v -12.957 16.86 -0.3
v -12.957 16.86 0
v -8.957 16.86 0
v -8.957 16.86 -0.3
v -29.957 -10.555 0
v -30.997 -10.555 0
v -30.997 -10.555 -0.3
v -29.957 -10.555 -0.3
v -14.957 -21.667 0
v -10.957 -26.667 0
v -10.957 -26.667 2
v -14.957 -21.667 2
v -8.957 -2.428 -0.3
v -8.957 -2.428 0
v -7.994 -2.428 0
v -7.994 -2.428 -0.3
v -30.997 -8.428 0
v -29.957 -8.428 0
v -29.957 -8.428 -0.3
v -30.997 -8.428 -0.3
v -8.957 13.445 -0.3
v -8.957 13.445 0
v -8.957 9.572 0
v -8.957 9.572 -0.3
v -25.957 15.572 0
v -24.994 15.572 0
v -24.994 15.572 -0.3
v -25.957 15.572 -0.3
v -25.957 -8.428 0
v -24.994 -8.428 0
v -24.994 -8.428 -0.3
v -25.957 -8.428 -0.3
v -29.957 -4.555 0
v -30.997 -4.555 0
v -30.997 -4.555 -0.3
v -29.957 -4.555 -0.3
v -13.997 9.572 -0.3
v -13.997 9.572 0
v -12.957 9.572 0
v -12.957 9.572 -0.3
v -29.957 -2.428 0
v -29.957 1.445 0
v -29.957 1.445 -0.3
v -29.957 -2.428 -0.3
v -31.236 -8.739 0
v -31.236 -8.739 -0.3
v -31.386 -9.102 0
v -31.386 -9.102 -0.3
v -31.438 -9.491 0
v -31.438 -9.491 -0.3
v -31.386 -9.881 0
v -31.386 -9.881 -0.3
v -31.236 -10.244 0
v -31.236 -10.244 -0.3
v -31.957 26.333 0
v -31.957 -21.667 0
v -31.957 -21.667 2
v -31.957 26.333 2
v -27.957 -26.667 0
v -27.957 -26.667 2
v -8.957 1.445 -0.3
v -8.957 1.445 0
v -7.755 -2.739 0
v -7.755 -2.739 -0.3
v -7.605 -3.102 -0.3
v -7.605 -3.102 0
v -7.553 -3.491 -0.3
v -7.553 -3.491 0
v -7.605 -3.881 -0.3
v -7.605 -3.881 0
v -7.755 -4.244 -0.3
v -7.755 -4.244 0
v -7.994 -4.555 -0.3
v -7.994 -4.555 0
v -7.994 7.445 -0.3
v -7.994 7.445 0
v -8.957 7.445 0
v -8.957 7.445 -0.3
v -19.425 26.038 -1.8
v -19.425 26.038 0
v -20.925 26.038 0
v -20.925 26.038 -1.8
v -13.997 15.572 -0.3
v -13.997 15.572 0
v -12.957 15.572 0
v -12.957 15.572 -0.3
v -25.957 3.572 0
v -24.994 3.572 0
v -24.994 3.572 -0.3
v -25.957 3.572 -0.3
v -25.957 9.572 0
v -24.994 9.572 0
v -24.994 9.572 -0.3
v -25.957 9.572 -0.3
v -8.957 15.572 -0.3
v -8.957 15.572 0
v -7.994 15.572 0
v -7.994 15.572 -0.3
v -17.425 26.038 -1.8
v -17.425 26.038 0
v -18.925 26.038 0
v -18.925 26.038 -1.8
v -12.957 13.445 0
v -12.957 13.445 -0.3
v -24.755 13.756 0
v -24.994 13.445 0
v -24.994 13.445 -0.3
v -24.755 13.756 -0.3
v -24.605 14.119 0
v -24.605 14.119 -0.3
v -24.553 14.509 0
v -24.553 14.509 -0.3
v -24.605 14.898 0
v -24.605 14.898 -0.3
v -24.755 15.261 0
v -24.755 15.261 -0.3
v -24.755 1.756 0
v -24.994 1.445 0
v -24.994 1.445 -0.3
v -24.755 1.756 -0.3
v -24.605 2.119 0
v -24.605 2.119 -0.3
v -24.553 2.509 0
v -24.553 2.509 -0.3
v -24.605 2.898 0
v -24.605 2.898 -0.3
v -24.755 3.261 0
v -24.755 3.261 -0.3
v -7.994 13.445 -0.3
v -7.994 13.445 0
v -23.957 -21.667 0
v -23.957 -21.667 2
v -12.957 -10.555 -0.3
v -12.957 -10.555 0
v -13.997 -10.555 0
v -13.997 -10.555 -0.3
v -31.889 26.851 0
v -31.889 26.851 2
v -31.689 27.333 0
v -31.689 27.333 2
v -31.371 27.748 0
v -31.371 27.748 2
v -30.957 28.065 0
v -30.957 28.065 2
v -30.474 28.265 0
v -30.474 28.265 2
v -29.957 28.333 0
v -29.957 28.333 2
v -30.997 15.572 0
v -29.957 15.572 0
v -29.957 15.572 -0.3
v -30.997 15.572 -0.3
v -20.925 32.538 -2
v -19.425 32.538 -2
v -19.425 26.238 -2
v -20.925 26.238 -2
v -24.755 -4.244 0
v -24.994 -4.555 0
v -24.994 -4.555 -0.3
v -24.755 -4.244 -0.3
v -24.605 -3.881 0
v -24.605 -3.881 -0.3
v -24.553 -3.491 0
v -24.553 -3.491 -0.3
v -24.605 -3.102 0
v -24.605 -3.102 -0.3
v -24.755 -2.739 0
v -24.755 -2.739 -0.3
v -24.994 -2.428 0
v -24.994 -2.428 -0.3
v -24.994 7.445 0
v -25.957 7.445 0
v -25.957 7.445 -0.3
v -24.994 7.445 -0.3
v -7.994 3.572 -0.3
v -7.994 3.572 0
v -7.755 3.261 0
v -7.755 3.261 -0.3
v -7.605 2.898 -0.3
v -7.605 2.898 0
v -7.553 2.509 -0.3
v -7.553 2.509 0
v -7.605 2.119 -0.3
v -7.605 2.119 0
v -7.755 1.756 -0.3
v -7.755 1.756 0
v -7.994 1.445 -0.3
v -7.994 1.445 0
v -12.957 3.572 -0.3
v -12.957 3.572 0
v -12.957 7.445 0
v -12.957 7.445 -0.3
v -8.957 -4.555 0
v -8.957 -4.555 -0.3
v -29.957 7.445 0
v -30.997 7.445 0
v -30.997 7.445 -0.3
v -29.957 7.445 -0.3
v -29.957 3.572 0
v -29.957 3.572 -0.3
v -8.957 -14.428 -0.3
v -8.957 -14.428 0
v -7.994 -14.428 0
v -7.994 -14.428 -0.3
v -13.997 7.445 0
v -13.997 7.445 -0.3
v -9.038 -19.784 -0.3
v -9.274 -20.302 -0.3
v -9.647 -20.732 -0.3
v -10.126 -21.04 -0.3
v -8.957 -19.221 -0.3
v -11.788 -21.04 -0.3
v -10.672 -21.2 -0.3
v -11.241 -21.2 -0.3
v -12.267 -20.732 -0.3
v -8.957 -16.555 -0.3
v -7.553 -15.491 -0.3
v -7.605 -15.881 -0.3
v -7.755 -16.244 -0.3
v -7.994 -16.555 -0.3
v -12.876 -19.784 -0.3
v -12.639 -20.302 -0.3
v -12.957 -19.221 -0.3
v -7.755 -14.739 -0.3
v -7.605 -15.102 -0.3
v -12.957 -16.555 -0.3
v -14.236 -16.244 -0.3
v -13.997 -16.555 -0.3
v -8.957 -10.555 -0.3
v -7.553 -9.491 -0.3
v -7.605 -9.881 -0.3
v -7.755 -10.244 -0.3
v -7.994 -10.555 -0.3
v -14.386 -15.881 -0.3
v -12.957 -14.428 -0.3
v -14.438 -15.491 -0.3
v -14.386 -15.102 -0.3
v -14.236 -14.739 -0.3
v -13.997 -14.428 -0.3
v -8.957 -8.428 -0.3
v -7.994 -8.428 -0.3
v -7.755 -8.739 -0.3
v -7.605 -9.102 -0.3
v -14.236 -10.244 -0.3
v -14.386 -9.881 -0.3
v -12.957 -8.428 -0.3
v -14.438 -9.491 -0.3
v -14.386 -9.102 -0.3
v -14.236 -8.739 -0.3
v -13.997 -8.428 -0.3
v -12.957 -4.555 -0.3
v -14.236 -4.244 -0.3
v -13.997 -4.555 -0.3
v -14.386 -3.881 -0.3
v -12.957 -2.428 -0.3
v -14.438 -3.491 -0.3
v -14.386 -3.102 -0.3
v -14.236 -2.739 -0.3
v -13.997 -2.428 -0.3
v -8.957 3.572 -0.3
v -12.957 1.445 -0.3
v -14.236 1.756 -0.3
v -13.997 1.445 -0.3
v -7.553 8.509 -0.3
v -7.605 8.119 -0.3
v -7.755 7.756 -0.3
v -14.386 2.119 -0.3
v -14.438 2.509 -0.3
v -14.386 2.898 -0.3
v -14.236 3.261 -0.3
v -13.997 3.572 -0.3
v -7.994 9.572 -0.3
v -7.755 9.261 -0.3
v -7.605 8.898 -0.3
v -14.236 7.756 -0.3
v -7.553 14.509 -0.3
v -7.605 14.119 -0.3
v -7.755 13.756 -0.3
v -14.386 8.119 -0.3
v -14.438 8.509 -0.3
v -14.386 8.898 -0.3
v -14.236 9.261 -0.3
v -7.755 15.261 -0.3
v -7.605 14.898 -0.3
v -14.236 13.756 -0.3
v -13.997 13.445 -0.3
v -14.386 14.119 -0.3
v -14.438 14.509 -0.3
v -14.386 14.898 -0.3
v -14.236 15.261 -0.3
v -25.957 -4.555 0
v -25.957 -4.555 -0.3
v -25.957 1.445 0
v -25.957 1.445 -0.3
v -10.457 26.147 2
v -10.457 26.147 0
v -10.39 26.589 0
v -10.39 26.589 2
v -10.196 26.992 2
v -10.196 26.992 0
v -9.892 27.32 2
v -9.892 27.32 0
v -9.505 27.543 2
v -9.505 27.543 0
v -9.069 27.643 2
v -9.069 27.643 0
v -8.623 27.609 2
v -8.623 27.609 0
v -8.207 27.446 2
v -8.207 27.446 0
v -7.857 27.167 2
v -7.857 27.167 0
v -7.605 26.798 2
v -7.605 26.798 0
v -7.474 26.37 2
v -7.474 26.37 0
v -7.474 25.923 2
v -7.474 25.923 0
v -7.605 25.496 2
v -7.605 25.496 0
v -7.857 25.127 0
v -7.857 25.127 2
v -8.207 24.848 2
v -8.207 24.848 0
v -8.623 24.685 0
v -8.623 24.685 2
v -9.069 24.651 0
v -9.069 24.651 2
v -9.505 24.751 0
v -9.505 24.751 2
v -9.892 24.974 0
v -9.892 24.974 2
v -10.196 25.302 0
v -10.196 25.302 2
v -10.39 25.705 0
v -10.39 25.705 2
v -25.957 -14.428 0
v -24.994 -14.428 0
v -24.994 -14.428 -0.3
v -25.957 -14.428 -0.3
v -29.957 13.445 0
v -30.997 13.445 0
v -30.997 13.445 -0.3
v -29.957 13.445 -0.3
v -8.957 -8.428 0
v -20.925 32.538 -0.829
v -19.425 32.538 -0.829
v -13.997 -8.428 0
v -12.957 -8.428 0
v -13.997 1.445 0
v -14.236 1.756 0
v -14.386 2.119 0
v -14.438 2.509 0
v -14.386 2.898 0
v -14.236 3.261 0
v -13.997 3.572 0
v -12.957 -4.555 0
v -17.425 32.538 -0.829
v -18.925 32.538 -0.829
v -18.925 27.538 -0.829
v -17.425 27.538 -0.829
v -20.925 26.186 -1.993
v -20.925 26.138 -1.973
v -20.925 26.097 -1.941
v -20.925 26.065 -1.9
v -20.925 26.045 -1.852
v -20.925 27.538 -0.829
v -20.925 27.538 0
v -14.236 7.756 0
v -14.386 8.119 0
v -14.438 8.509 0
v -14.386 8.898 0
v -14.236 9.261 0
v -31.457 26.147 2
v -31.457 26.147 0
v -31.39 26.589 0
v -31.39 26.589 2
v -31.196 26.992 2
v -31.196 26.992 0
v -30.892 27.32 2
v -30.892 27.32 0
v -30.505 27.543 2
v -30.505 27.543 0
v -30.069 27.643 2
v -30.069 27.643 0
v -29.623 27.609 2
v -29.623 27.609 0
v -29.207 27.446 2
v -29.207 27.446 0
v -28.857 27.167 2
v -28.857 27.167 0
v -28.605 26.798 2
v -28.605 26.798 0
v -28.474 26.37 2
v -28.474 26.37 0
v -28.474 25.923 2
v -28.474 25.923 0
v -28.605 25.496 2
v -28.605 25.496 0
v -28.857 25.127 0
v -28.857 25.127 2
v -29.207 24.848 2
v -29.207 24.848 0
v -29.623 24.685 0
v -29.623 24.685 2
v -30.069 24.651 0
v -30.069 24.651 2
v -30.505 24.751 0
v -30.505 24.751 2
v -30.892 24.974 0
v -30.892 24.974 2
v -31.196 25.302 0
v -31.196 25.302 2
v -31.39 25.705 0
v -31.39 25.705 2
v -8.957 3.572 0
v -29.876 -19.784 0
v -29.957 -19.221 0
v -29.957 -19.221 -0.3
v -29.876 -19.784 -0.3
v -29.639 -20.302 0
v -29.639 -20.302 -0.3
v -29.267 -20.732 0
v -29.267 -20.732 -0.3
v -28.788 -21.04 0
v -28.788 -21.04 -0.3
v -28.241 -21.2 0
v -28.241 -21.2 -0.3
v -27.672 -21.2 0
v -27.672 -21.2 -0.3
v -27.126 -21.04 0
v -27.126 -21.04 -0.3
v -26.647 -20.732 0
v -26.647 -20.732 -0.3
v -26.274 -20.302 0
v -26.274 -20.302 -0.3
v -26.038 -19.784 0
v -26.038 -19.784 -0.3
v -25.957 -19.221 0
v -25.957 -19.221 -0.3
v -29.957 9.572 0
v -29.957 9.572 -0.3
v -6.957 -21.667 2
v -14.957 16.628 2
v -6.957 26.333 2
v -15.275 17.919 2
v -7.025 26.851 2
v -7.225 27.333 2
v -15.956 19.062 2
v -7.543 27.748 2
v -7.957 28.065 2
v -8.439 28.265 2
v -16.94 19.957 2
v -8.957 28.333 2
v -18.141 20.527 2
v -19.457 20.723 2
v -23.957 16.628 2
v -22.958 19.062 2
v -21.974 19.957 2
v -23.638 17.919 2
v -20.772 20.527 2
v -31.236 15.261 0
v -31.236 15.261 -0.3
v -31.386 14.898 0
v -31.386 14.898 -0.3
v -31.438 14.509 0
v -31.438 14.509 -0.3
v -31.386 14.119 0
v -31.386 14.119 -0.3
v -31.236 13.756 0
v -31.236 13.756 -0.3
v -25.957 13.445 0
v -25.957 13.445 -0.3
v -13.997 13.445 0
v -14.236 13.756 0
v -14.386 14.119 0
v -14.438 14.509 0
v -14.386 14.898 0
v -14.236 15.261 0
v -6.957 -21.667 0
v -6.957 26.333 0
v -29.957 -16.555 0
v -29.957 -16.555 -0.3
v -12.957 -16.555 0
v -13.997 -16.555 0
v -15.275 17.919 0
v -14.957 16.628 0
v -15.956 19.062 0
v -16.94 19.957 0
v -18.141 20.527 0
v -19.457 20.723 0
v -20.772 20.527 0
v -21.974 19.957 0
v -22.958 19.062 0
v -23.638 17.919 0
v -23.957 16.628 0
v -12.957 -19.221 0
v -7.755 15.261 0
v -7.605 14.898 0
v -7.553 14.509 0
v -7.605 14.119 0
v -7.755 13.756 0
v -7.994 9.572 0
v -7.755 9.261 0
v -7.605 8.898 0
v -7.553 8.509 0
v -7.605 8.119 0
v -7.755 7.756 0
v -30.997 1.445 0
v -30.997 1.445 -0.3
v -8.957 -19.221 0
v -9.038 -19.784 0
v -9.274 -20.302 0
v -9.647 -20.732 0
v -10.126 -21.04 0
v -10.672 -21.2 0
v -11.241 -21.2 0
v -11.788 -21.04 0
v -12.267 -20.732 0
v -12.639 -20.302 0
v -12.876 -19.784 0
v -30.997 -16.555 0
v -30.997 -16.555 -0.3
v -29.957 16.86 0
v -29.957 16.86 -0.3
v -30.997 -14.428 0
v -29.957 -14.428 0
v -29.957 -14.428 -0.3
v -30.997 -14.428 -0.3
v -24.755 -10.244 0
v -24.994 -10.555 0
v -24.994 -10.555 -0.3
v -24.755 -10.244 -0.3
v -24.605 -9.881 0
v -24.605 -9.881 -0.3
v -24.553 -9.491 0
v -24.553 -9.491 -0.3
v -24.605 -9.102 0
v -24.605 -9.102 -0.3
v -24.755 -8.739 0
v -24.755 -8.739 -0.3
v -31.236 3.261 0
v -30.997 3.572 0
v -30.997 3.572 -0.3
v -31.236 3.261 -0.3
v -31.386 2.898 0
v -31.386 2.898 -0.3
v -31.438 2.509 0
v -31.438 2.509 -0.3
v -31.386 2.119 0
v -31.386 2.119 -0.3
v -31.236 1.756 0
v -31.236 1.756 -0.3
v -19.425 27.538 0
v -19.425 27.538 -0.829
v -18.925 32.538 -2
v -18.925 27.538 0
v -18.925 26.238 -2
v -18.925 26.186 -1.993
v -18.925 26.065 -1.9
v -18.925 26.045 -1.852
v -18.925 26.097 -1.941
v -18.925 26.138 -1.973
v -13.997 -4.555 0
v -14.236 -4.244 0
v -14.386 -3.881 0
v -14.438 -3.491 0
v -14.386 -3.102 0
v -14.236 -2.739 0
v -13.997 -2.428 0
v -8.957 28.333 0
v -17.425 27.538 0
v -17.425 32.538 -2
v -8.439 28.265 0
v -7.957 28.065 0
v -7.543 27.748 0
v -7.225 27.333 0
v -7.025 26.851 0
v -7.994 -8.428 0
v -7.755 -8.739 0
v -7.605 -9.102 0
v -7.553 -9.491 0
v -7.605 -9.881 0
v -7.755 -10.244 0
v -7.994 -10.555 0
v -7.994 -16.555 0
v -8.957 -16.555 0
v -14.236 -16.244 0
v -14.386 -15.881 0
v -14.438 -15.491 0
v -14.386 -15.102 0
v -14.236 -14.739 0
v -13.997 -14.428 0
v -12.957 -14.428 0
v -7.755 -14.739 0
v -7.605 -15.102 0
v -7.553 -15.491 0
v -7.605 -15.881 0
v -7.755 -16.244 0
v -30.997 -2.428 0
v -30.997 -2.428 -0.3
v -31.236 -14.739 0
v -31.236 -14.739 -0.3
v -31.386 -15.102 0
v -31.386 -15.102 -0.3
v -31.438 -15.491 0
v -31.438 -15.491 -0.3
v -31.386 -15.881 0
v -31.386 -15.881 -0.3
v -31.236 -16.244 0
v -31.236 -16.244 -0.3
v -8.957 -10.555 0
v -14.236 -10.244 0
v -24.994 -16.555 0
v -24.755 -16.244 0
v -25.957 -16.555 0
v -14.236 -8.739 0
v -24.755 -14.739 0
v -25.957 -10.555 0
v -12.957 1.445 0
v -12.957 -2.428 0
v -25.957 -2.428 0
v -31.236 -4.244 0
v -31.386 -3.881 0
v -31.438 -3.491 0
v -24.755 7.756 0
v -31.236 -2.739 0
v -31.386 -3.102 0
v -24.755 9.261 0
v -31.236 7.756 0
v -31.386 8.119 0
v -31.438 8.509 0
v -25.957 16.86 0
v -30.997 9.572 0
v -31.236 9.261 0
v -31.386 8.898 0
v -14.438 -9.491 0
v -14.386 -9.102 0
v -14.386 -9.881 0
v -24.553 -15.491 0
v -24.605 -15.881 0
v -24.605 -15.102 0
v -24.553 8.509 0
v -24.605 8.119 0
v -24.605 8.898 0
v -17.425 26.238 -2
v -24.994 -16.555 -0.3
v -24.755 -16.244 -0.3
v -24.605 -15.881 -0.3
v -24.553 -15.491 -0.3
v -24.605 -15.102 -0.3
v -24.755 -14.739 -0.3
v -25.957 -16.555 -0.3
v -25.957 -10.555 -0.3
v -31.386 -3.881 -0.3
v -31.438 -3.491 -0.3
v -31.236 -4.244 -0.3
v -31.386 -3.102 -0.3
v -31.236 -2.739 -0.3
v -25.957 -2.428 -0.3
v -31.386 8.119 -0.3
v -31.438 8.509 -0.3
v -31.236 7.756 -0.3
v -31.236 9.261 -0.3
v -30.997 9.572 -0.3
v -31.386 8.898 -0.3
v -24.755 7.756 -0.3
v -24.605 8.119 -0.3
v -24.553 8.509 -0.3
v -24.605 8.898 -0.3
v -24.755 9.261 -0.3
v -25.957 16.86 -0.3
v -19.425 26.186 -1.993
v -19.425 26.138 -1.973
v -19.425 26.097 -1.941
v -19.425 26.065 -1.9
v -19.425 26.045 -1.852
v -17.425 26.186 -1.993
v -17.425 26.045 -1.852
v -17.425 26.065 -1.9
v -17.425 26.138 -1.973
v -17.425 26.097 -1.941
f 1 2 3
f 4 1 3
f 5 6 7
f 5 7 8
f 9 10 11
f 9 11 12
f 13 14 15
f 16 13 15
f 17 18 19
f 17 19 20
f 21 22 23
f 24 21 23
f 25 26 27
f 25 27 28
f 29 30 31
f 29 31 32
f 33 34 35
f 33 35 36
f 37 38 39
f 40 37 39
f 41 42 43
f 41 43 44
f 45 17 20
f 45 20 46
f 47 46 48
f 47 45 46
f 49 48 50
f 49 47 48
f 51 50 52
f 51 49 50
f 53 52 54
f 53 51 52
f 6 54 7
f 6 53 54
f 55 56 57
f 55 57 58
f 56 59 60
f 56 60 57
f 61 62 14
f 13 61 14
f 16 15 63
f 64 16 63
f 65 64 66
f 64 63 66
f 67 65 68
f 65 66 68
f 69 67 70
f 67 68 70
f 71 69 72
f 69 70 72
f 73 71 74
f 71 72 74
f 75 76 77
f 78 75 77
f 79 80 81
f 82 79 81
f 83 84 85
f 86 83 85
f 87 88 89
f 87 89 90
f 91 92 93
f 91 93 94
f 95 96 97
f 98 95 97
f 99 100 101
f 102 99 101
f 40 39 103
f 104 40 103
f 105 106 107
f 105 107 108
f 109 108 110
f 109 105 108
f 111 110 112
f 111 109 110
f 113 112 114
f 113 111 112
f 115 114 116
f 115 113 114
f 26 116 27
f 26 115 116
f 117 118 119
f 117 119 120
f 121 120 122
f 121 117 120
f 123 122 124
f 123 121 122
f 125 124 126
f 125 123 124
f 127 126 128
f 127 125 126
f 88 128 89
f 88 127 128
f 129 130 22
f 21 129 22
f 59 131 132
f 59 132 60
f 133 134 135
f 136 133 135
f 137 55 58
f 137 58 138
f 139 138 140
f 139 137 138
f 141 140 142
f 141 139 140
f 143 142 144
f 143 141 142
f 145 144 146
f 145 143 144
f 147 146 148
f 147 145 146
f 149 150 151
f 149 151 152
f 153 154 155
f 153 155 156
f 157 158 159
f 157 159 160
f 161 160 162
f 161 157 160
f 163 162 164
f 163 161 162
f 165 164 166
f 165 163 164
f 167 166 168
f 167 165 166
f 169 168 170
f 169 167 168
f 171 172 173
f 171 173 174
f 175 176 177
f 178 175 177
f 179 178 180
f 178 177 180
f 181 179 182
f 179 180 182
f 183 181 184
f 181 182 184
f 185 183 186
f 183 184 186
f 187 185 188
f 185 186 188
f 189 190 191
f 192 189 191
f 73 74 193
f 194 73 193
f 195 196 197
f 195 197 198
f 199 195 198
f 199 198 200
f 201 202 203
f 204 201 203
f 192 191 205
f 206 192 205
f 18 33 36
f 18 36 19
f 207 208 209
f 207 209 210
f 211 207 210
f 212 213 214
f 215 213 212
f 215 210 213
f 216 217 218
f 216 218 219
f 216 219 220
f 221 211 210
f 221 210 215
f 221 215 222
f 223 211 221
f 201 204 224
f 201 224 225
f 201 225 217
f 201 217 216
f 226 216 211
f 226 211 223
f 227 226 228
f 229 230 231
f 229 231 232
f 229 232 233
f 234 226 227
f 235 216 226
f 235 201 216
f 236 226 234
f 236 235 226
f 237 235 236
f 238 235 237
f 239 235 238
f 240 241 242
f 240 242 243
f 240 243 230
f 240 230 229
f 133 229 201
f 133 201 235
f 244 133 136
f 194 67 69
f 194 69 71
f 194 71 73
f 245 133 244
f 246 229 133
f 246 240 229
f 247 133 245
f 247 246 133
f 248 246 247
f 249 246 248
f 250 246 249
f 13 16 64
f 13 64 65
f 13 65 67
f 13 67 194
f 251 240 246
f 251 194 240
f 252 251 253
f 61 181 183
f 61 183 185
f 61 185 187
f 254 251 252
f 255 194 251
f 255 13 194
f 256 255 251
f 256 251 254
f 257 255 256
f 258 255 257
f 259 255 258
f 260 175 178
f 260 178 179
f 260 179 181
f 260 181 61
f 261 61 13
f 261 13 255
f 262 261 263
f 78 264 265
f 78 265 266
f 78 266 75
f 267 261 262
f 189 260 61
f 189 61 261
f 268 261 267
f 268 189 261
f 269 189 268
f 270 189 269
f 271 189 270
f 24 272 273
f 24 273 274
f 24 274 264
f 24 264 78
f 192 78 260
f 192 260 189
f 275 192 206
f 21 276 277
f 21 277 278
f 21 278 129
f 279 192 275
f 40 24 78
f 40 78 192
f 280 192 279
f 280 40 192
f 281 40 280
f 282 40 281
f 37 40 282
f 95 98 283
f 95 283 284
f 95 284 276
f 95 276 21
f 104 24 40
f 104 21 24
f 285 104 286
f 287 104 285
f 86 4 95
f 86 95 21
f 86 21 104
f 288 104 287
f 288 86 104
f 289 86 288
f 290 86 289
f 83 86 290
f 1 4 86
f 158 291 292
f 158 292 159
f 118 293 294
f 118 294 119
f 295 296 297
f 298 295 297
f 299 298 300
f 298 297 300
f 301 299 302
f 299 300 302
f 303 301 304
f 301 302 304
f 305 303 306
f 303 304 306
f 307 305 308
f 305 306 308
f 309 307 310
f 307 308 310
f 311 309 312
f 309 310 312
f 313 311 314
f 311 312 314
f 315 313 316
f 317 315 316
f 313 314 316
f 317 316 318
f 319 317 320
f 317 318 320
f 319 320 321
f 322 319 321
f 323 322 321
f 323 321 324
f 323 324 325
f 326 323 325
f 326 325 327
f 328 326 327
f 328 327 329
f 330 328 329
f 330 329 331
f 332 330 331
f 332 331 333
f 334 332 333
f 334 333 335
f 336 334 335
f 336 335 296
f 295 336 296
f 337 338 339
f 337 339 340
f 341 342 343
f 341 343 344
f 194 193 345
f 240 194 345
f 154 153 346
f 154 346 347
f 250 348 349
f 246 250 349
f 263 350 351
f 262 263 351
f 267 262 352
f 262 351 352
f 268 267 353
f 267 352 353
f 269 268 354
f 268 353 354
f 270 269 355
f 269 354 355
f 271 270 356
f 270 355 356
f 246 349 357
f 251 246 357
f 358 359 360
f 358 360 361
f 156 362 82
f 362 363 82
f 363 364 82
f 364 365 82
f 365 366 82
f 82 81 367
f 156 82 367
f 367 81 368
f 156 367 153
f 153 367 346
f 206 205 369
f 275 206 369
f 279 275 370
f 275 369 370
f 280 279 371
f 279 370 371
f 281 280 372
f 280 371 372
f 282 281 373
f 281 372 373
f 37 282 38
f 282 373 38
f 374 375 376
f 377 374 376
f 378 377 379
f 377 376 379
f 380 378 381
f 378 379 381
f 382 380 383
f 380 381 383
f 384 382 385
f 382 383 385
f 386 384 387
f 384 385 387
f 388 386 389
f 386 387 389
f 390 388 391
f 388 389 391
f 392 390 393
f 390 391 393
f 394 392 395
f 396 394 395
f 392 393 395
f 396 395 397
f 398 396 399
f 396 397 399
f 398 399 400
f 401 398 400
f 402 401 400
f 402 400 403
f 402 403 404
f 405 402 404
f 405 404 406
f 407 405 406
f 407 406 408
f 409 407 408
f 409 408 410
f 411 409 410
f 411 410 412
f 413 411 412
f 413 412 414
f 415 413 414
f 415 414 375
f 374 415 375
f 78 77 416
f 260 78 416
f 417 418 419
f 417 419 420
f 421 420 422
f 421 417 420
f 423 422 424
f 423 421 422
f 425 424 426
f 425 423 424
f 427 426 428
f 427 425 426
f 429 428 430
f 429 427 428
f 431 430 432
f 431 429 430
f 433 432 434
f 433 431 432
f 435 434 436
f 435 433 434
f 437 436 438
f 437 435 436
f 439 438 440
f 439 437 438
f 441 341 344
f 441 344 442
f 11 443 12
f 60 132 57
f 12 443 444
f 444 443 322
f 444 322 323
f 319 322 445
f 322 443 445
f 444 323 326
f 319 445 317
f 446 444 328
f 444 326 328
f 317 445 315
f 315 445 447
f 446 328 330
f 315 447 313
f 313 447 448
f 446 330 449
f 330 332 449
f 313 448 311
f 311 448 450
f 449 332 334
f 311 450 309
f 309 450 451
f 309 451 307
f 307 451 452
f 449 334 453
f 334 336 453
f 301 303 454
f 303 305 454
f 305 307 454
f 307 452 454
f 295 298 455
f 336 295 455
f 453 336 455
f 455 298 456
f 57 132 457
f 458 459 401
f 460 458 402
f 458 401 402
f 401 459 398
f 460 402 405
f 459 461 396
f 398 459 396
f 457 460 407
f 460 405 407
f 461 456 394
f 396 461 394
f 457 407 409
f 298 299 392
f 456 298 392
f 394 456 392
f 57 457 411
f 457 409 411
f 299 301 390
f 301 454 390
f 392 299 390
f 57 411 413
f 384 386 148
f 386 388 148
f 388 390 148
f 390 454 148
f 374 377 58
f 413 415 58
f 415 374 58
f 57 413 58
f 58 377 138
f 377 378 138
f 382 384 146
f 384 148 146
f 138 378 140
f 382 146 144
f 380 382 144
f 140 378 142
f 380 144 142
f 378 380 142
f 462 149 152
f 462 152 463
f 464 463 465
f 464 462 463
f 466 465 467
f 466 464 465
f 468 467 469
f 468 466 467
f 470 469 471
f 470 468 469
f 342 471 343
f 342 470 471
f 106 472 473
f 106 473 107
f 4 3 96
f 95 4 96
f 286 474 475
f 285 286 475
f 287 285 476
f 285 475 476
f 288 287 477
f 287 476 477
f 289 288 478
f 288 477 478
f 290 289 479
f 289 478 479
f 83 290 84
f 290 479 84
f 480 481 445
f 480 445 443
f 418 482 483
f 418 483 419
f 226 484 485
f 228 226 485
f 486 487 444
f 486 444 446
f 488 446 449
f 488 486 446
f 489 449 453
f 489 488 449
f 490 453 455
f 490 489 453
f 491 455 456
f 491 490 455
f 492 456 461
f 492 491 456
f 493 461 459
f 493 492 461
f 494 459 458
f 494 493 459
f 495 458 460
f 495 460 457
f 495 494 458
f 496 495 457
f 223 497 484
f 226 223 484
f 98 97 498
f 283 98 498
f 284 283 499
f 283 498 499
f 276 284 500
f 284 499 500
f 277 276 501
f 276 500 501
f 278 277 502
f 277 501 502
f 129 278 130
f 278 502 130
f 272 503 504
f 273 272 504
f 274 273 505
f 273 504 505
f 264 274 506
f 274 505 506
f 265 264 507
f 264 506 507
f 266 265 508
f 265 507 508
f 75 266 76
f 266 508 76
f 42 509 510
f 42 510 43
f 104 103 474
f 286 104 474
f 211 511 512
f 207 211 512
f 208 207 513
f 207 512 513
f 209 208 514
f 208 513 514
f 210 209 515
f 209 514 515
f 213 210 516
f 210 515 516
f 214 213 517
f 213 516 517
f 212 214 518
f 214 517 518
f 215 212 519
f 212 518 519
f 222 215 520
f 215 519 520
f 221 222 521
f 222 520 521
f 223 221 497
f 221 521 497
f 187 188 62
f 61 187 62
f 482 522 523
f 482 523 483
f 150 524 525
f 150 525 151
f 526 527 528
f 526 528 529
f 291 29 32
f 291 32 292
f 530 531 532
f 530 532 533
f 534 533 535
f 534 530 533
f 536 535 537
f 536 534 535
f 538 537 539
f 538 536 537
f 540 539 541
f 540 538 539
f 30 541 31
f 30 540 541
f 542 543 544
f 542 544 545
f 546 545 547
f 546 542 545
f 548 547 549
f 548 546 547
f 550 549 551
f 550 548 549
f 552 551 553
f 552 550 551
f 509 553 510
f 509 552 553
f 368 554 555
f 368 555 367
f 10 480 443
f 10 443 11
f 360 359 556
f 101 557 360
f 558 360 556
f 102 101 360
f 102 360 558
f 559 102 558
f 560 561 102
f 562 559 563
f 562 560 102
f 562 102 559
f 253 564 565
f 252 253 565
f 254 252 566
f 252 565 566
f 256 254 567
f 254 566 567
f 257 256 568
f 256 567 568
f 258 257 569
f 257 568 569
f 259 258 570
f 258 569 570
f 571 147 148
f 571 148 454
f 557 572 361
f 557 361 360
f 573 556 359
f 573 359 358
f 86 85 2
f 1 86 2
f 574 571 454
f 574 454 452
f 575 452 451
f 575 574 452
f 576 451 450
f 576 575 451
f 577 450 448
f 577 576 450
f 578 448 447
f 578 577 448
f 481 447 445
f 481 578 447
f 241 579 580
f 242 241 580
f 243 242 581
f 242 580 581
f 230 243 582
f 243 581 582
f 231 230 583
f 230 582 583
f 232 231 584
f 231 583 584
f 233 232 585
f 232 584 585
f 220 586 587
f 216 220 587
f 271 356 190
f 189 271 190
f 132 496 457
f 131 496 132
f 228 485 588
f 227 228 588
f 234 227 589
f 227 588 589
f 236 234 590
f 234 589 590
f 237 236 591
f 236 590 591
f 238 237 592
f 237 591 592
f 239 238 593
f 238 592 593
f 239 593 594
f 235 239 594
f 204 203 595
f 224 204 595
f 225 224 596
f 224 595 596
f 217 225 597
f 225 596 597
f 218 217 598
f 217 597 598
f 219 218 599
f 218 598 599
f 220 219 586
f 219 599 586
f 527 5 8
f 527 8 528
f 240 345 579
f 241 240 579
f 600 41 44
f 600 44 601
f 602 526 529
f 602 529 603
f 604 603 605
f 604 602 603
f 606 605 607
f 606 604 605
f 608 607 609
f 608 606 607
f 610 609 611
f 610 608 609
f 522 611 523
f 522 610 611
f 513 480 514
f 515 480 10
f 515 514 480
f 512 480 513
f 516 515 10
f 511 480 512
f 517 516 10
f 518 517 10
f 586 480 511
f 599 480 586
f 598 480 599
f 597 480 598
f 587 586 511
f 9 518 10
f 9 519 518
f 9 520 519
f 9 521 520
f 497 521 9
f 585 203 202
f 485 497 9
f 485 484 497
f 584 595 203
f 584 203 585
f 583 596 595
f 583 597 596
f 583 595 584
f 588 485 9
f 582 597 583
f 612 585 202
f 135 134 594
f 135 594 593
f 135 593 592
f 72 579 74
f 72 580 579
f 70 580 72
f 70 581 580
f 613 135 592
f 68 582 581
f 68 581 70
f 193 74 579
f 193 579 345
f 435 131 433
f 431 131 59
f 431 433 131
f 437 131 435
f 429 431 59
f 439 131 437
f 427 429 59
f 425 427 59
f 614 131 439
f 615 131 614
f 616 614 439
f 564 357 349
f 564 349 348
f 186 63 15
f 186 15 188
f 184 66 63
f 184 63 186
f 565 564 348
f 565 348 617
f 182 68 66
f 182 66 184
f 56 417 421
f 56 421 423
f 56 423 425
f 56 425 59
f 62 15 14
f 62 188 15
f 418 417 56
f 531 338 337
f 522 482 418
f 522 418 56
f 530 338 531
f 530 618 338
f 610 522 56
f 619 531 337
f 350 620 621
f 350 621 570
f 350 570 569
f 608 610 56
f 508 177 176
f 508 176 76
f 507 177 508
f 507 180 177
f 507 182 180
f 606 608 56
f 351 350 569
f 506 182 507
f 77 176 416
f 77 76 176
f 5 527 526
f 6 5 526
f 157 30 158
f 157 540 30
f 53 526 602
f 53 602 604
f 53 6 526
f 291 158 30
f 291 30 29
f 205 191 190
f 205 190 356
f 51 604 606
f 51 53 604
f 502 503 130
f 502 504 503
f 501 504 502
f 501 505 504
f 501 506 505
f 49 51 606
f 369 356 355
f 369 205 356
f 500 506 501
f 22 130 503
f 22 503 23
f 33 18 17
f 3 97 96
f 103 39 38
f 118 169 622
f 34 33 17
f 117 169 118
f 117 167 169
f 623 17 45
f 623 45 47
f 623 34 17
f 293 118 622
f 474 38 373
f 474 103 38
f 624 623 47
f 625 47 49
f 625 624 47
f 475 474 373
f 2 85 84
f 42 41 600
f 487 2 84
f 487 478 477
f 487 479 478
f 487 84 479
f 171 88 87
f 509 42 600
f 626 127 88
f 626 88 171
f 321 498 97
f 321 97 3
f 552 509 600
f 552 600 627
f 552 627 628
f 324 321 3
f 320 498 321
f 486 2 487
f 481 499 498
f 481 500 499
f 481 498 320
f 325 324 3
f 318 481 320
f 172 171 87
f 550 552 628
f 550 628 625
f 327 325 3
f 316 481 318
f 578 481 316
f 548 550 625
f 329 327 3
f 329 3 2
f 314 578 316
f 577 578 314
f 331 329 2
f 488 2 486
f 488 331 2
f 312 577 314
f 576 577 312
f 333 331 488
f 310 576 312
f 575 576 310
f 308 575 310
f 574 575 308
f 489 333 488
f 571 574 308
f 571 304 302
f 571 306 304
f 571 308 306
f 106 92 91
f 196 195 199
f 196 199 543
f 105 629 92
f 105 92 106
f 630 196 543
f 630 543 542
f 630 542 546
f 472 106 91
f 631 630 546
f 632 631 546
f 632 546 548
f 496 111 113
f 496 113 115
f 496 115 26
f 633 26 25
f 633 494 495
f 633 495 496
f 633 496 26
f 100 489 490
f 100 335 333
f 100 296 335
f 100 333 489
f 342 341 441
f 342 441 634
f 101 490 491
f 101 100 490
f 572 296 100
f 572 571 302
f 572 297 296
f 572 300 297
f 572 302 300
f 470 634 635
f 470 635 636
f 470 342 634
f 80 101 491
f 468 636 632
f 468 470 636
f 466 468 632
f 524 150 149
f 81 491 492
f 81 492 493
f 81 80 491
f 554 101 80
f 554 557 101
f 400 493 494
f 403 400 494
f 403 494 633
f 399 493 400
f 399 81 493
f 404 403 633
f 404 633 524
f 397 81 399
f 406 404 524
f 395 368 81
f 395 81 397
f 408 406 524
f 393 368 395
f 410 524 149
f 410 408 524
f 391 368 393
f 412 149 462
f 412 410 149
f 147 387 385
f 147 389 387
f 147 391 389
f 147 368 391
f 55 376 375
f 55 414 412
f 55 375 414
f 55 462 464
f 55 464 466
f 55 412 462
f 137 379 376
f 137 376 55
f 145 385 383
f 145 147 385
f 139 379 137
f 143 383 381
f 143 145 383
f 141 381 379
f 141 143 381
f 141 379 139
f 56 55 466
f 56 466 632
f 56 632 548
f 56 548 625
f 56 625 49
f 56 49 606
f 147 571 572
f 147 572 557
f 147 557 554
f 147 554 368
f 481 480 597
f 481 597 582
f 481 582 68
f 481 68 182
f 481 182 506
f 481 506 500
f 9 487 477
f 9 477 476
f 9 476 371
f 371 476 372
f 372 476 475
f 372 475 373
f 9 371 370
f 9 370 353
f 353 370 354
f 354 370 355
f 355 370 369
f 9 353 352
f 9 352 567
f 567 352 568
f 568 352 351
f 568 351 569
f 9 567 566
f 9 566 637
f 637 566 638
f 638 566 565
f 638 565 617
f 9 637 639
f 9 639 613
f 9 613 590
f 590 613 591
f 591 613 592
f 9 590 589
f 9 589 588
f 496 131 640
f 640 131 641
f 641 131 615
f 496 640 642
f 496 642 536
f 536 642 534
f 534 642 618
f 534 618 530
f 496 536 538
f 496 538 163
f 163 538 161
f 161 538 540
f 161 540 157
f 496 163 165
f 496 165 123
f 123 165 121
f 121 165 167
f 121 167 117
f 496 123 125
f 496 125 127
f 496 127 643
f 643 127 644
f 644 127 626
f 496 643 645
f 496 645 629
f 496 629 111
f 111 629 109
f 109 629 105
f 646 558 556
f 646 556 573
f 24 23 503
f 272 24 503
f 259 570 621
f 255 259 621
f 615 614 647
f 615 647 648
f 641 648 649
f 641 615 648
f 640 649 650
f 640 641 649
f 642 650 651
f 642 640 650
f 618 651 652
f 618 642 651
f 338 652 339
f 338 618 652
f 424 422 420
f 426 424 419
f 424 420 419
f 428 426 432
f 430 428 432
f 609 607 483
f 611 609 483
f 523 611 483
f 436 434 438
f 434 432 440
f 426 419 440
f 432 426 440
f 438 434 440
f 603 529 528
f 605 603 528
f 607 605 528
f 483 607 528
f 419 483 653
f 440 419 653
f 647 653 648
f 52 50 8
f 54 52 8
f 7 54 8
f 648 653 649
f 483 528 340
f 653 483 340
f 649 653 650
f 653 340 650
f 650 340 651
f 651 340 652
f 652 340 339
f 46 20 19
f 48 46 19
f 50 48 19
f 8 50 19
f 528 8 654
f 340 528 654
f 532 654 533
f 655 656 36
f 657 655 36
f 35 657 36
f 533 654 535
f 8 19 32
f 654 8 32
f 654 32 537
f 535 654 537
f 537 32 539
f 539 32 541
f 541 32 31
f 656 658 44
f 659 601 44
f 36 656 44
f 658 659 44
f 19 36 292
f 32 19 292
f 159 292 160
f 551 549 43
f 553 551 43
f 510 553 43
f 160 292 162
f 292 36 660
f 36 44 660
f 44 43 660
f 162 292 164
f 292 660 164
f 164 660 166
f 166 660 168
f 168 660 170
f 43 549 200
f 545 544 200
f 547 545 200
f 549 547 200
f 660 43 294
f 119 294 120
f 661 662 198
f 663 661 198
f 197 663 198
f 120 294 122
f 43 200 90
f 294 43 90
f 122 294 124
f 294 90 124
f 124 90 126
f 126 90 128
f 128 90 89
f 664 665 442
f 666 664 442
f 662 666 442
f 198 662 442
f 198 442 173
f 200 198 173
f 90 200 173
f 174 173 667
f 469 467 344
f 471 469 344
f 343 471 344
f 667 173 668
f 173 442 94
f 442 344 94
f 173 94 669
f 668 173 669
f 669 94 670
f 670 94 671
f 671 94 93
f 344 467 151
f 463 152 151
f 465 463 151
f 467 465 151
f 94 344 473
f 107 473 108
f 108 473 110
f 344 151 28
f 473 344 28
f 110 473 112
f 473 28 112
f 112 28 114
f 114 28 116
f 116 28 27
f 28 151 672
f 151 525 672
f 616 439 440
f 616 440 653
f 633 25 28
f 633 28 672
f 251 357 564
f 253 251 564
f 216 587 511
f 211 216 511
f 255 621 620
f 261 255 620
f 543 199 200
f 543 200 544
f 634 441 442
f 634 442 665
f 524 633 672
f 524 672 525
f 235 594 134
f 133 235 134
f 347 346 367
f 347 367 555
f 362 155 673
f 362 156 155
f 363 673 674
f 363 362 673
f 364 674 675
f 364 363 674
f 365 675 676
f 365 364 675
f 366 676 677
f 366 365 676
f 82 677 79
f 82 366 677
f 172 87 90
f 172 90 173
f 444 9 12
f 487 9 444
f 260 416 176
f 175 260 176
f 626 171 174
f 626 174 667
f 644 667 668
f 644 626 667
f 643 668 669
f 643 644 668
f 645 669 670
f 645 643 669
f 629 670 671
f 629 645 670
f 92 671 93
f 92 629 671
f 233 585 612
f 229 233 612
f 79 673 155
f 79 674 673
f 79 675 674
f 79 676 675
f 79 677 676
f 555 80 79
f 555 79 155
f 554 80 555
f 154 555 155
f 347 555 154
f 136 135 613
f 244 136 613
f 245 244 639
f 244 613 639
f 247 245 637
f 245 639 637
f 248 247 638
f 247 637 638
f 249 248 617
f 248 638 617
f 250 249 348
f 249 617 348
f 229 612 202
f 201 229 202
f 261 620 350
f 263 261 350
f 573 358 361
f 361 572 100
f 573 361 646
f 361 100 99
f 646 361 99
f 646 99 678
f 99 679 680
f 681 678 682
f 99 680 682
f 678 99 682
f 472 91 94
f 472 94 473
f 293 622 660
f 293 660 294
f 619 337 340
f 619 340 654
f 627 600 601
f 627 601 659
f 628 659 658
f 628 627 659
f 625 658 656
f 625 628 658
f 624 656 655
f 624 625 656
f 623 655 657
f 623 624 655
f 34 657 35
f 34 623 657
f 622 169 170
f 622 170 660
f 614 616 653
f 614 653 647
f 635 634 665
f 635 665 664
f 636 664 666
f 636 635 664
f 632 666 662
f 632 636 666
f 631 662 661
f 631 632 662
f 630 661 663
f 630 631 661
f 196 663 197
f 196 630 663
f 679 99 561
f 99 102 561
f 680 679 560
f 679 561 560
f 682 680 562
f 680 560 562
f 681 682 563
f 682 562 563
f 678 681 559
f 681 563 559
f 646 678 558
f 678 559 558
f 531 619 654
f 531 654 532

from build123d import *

# Parameters (mm, degrees)
BOSS_EXTRUDE1_DEPTH = 2
CUT_EXTRUDE1_REACH  = 44.755
SKETCH2_R           = 1.5
SKETCH3_W           = 1.5
SKETCH3_H           = 1.5
BOSS_EXTRUDE2_DEPTH = 2
SKETCH6_W           = 1.5
SKETCH6_H           = 1.17146139
BOSS_EXTRUDE5_DEPTH = 5
FILLET1_R           = 0.2
BOSS_EXTRUDE6_DEPTH = 0.3


with BuildPart() as part:
    # Sketch1 → Boss-Extrude1 (new body)
    with BuildSketch(Plane.XY):
        with BuildLine():
            Line((-31.956856316, -21.666666667), (-31.956856316, 26.333333333))
            ThreePointArc((-31.956856316, 26.333333333), (-31.371069879, 27.747546896), (-29.956856316, 28.333333333))
            Line((-29.956856316, 28.333333333), (-8.956856316, 28.333333333))
            ThreePointArc((-8.956856316, 28.333333333), (-7.542642754, 27.747546896), (-6.956856316, 26.333333333))
            Line((-6.956856316, 26.333333333), (-6.956856316, -21.666666667))
            Line((-6.956856316, -21.666666667), (-10.956856316, -26.666666667))
            Line((-10.956856316, -26.666666667), (-14.956856316, -21.666666667))
            Line((-14.956856316, -21.666666667), (-14.956856316, 16.627941441))
            ThreePointArc((-14.956856316, 16.627941441), (-19.456856316, 20.722627268), (-23.956856316, 16.627941441))
            Line((-23.956856316, 16.627941441), (-23.956856316, -21.666666667))
            Line((-23.956856316, -21.666666667), (-27.956856316, -26.666666667))
            Line((-27.956856316, -26.666666667), (-31.956856316, -21.666666667))
        make_face()
    extrude(amount=BOSS_EXTRUDE1_DEPTH)

    # Sketch2 → Cut-Extrude1 (cut, up to next)
    with BuildSketch(Plane(origin=(0, 0, 0), x_dir=(-1, 0, 0), z_dir=(0, 0, -1)), mode=Mode.PRIVATE) as cut_extrude1_sk1:
        with Locations((8.956856316, 26.146893442)):
            Circle(SKETCH2_R)
    cut_extrude1_tool1 = extrude(cut_extrude1_sk1.sketch, amount=-CUT_EXTRUDE1_REACH, mode=Mode.PRIVATE) & part.part
    # Sketch2 → Cut-Extrude1 (cut, up to next)
    with BuildSketch(Plane(origin=(0, 0, 0), x_dir=(-1, 0, 0), z_dir=(0, 0, -1)), mode=Mode.PRIVATE) as cut_extrude1_sk2:
        with Locations((29.956856316, 26.146893442)):
            Circle(SKETCH2_R)
    cut_extrude1_tool2 = extrude(cut_extrude1_sk2.sketch, amount=-CUT_EXTRUDE1_REACH, mode=Mode.PRIVATE) & part.part
    add(cut_extrude1_tool1.solids().sort_by_distance((-8.956856, 26.146893, 0))[0], mode=Mode.SUBTRACT)
    add(cut_extrude1_tool2.solids().sort_by_distance((-29.956856, 26.146893, 0))[0], mode=Mode.SUBTRACT)

    # Sketch3 → Boss-Extrude2 (add)
    with BuildSketch(Plane(origin=(0, 0, 0), x_dir=(-1, 0, 0), z_dir=(0, 0, -1))):
        with Locations((20.175136294, 26.788088759)):
            Rectangle(SKETCH3_W, SKETCH3_H)
        with Locations((18.175136294, 26.788088759)):
            Rectangle(SKETCH3_W, SKETCH3_H)
    extrude(amount=BOSS_EXTRUDE2_DEPTH)

    # Sketch6 → Boss-Extrude5 (add)
    with BuildSketch(Plane(origin=(0, 27.538088759, 0), x_dir=(1, 0, 0), z_dir=(0, 1, 0))):
        with Locations((-18.175136294, 1.414269305)):
            Rectangle(SKETCH6_W, SKETCH6_H)
        with Locations((-20.175136294, 1.414269305)):
            Rectangle(SKETCH6_W, SKETCH6_H)
    extrude(amount=BOSS_EXTRUDE5_DEPTH)

    # Fillet1
    fillet1_edges = [part.edges().sort_by_distance(p)[0] for p in [
        (-18.175136294, 26.038088759, -2),
        (-20.175136294, 26.038088759, -2),
    ]]
    fillet(fillet1_edges, radius=FILLET1_R)

    # Sketch7 → Boss-Extrude6 (add)
    with BuildSketch(Plane(origin=(0, 0, 0), x_dir=(-1, 0, 0), z_dir=(0, 0, -1))):
        with BuildLine():
            Line((8.956856316, 16.860436634), (8.956856316, 15.572285455))
            Line((8.956856316, 15.572285455), (7.994072914, 15.572285455))
            ThreePointArc((7.994072914, 15.572285455), (7.553465888, 14.508565999), (7.994072914, 13.444846543))
            Line((7.994072914, 13.444846543), (8.956856316, 13.444846543))
            Line((8.956856316, 13.444846543), (8.956856316, 9.572285455))
            Line((8.956856316, 9.572285455), (7.994072914, 9.572285455))
            ThreePointArc((7.994072914, 9.572285455), (7.553465888, 8.508565999), (7.994072914, 7.444846543))
            Line((7.994072914, 7.444846543), (8.956856316, 7.444846543))
            Line((8.956856316, 7.444846543), (8.956856316, 3.572285455))
            Line((8.956856316, 3.572285455), (7.994072914, 3.572285455))
            ThreePointArc((7.994072914, 3.572285455), (7.553465888, 2.508565999), (7.994072914, 1.444846543))
            Line((7.994072914, 1.444846543), (8.956856316, 1.444846543))
            Line((8.956856316, 1.444846543), (8.956856316, -2.427714545))
            Line((8.956856316, -2.427714545), (7.994072914, -2.427714545))
            ThreePointArc((7.994072914, -2.427714545), (7.553465888, -3.491434001), (7.994072914, -4.555153457))
            Line((7.994072914, -4.555153457), (8.956856316, -4.555153457))
            Line((8.956856316, -4.555153457), (8.956856316, -8.427714545))
            Line((8.956856316, -8.427714545), (7.994072914, -8.427714545))
            ThreePointArc((7.994072914, -8.427714545), (7.553465888, -9.491434001), (7.994072914, -10.555153457))
            Line((7.994072914, -10.555153457), (8.956856316, -10.555153457))
            Line((8.956856316, -10.555153457), (8.956856316, -14.427714545))
            Line((8.956856316, -14.427714545), (7.994072914, -14.427714545))
            ThreePointArc((7.994072914, -14.427714545), (7.553465888, -15.491434001), (7.994072914, -16.555153457))
            Line((7.994072914, -16.555153457), (8.956856316, -16.555153457))
            Line((8.956856316, -16.555153457), (8.956856316, -19.220690879))
            ThreePointArc((8.956856316, -19.220690879), (10.956856316, -21.220690879), (12.956856316, -19.220690879))
            Line((12.956856316, -19.220690879), (12.956856316, -16.555153457))
            Line((12.956856316, -16.555153457), (13.997034927, -16.555153457))
            ThreePointArc((13.997034927, -16.555153457), (14.437641952, -15.491434001), (13.997034927, -14.427714545))
            Line((13.997034927, -14.427714545), (12.956856316, -14.427714545))
            Line((12.956856316, -14.427714545), (12.956856316, -10.555153457))
            Line((12.956856316, -10.555153457), (13.997034927, -10.555153457))
            ThreePointArc((13.997034927, -10.555153457), (14.437641952, -9.491434001), (13.997034927, -8.427714545))
            Line((13.997034927, -8.427714545), (12.956856316, -8.427714545))
            Line((12.956856316, -8.427714545), (12.956856316, -4.555153457))
            Line((12.956856316, -4.555153457), (13.997034927, -4.555153457))
            ThreePointArc((13.997034927, -4.555153457), (14.437641952, -3.491434001), (13.997034927, -2.427714545))
            Line((13.997034927, -2.427714545), (12.956856316, -2.427714545))
            Line((12.956856316, -2.427714545), (12.956856316, 1.444846543))
            Line((12.956856316, 1.444846543), (13.997034927, 1.444846543))
            ThreePointArc((13.997034927, 1.444846543), (14.437641952, 2.508565999), (13.997034927, 3.572285455))
            Line((13.997034927, 3.572285455), (12.956856316, 3.572285455))
            Line((12.956856316, 3.572285455), (12.956856316, 7.444846543))
            Line((12.956856316, 7.444846543), (13.997034927, 7.444846543))
            ThreePointArc((13.997034927, 7.444846543), (14.437641952, 8.508565999), (13.997034927, 9.572285455))
            Line((13.997034927, 9.572285455), (12.956856316, 9.572285455))
            Line((12.956856316, 9.572285455), (12.956856316, 13.444846543))
            Line((12.956856316, 13.444846543), (13.997034927, 13.444846543))
            ThreePointArc((13.997034927, 13.444846543), (14.437641952, 14.508565999), (13.997034927, 15.572285455))
            Line((13.997034927, 15.572285455), (12.956856316, 15.572285455))
            Line((12.956856316, 15.572285455), (12.956856316, 16.860436634))
            Line((12.956856316, 16.860436634), (8.956856316, 16.860436634))
        make_face()
        with BuildLine():
            Line((30.997034927, -16.555153457), (29.956856316, -16.555153457))
            Line((29.956856316, -16.555153457), (29.956856316, -19.220690879))
            ThreePointArc((29.956856316, -19.220690879), (27.956856316, -21.220690879), (25.956856316, -19.220690879))
            Line((25.956856316, -19.220690879), (25.956856316, -16.555153457))
            Line((25.956856316, -16.555153457), (24.994072914, -16.555153457))
            ThreePointArc((24.994072914, -16.555153457), (24.553465888, -15.491434001), (24.994072914, -14.427714545))
            Line((24.994072914, -14.427714545), (25.956856316, -14.427714545))
            Line((25.956856316, -14.427714545), (25.956856316, -10.555153457))
            Line((25.956856316, -10.555153457), (24.994072914, -10.555153457))
            ThreePointArc((24.994072914, -10.555153457), (24.553465888, -9.491434001), (24.994072914, -8.427714545))
            Line((24.994072914, -8.427714545), (25.956856316, -8.427714545))
            Line((25.956856316, -8.427714545), (25.956856316, -4.555153457))
            Line((25.956856316, -4.555153457), (24.994072914, -4.555153457))
            ThreePointArc((24.994072914, -4.555153457), (24.553465888, -3.491434001), (24.994072914, -2.427714545))
            Line((24.994072914, -2.427714545), (25.956856316, -2.427714545))
            Line((25.956856316, -2.427714545), (25.956856316, 1.444846543))
            Line((25.956856316, 1.444846543), (24.994072914, 1.444846543))
            ThreePointArc((24.994072914, 1.444846543), (24.553465888, 2.508565999), (24.994072914, 3.572285455))
            Line((24.994072914, 3.572285455), (25.956856316, 3.572285455))
            Line((25.956856316, 3.572285455), (25.956856316, 7.444846543))
            Line((25.956856316, 7.444846543), (24.994072914, 7.444846543))
            ThreePointArc((24.994072914, 7.444846543), (24.553465888, 8.508565999), (24.994072914, 9.572285455))
            Line((24.994072914, 9.572285455), (25.956856316, 9.572285455))
            Line((25.956856316, 9.572285455), (25.956856316, 13.444846543))
            Line((25.956856316, 13.444846543), (24.994072914, 13.444846543))
            ThreePointArc((24.994072914, 13.444846543), (24.553465888, 14.508565999), (24.994072914, 15.572285455))
            Line((24.994072914, 15.572285455), (25.956856316, 15.572285455))
            Line((25.956856316, 15.572285455), (25.956856316, 16.860436634))
            Line((25.956856316, 16.860436634), (29.956856316, 16.860436634))
            Line((29.956856316, 16.860436634), (29.956856316, 15.572285455))
            Line((29.956856316, 15.572285455), (30.997034927, 15.572285455))
            ThreePointArc((30.997034927, 15.572285455), (31.437641952, 14.508565999), (30.997034927, 13.444846543))
            Line((30.997034927, 13.444846543), (29.956856316, 13.444846543))
            Line((29.956856316, 13.444846543), (29.956856316, 9.572285455))
            Line((29.956856316, 9.572285455), (30.997034927, 9.572285455))
            ThreePointArc((30.997034927, 9.572285455), (31.437641952, 8.508565999), (30.997034927, 7.444846543))
            Line((30.997034927, 7.444846543), (29.956856316, 7.444846543))
            Line((29.956856316, 7.444846543), (29.956856316, 3.572285455))
            Line((29.956856316, 3.572285455), (30.997034927, 3.572285455))
            ThreePointArc((30.997034927, 3.572285455), (31.437641952, 2.508565999), (30.997034927, 1.444846543))
            Line((30.997034927, 1.444846543), (29.956856316, 1.444846543))
            Line((29.956856316, 1.444846543), (29.956856316, -2.427714545))
            Line((29.956856316, -2.427714545), (30.997034927, -2.427714545))
            ThreePointArc((30.997034927, -2.427714545), (31.437641952, -3.491434001), (30.997034927, -4.555153457))
            Line((30.997034927, -4.555153457), (29.956856316, -4.555153457))
            Line((29.956856316, -4.555153457), (29.956856316, -8.427714545))
            Line((29.956856316, -8.427714545), (30.997034927, -8.427714545))
            ThreePointArc((30.997034927, -8.427714545), (31.437641952, -9.491434001), (30.997034927, -10.555153457))
            Line((30.997034927, -10.555153457), (29.956856316, -10.555153457))
            Line((29.956856316, -10.555153457), (29.956856316, -14.427714545))
            Line((29.956856316, -14.427714545), (30.997034927, -14.427714545))
            ThreePointArc((30.997034927, -14.427714545), (31.437641952, -15.491434001), (30.997034927, -16.555153457))
        make_face()
    extrude(amount=BOSS_EXTRUDE6_DEPTH)


solid = part.part
